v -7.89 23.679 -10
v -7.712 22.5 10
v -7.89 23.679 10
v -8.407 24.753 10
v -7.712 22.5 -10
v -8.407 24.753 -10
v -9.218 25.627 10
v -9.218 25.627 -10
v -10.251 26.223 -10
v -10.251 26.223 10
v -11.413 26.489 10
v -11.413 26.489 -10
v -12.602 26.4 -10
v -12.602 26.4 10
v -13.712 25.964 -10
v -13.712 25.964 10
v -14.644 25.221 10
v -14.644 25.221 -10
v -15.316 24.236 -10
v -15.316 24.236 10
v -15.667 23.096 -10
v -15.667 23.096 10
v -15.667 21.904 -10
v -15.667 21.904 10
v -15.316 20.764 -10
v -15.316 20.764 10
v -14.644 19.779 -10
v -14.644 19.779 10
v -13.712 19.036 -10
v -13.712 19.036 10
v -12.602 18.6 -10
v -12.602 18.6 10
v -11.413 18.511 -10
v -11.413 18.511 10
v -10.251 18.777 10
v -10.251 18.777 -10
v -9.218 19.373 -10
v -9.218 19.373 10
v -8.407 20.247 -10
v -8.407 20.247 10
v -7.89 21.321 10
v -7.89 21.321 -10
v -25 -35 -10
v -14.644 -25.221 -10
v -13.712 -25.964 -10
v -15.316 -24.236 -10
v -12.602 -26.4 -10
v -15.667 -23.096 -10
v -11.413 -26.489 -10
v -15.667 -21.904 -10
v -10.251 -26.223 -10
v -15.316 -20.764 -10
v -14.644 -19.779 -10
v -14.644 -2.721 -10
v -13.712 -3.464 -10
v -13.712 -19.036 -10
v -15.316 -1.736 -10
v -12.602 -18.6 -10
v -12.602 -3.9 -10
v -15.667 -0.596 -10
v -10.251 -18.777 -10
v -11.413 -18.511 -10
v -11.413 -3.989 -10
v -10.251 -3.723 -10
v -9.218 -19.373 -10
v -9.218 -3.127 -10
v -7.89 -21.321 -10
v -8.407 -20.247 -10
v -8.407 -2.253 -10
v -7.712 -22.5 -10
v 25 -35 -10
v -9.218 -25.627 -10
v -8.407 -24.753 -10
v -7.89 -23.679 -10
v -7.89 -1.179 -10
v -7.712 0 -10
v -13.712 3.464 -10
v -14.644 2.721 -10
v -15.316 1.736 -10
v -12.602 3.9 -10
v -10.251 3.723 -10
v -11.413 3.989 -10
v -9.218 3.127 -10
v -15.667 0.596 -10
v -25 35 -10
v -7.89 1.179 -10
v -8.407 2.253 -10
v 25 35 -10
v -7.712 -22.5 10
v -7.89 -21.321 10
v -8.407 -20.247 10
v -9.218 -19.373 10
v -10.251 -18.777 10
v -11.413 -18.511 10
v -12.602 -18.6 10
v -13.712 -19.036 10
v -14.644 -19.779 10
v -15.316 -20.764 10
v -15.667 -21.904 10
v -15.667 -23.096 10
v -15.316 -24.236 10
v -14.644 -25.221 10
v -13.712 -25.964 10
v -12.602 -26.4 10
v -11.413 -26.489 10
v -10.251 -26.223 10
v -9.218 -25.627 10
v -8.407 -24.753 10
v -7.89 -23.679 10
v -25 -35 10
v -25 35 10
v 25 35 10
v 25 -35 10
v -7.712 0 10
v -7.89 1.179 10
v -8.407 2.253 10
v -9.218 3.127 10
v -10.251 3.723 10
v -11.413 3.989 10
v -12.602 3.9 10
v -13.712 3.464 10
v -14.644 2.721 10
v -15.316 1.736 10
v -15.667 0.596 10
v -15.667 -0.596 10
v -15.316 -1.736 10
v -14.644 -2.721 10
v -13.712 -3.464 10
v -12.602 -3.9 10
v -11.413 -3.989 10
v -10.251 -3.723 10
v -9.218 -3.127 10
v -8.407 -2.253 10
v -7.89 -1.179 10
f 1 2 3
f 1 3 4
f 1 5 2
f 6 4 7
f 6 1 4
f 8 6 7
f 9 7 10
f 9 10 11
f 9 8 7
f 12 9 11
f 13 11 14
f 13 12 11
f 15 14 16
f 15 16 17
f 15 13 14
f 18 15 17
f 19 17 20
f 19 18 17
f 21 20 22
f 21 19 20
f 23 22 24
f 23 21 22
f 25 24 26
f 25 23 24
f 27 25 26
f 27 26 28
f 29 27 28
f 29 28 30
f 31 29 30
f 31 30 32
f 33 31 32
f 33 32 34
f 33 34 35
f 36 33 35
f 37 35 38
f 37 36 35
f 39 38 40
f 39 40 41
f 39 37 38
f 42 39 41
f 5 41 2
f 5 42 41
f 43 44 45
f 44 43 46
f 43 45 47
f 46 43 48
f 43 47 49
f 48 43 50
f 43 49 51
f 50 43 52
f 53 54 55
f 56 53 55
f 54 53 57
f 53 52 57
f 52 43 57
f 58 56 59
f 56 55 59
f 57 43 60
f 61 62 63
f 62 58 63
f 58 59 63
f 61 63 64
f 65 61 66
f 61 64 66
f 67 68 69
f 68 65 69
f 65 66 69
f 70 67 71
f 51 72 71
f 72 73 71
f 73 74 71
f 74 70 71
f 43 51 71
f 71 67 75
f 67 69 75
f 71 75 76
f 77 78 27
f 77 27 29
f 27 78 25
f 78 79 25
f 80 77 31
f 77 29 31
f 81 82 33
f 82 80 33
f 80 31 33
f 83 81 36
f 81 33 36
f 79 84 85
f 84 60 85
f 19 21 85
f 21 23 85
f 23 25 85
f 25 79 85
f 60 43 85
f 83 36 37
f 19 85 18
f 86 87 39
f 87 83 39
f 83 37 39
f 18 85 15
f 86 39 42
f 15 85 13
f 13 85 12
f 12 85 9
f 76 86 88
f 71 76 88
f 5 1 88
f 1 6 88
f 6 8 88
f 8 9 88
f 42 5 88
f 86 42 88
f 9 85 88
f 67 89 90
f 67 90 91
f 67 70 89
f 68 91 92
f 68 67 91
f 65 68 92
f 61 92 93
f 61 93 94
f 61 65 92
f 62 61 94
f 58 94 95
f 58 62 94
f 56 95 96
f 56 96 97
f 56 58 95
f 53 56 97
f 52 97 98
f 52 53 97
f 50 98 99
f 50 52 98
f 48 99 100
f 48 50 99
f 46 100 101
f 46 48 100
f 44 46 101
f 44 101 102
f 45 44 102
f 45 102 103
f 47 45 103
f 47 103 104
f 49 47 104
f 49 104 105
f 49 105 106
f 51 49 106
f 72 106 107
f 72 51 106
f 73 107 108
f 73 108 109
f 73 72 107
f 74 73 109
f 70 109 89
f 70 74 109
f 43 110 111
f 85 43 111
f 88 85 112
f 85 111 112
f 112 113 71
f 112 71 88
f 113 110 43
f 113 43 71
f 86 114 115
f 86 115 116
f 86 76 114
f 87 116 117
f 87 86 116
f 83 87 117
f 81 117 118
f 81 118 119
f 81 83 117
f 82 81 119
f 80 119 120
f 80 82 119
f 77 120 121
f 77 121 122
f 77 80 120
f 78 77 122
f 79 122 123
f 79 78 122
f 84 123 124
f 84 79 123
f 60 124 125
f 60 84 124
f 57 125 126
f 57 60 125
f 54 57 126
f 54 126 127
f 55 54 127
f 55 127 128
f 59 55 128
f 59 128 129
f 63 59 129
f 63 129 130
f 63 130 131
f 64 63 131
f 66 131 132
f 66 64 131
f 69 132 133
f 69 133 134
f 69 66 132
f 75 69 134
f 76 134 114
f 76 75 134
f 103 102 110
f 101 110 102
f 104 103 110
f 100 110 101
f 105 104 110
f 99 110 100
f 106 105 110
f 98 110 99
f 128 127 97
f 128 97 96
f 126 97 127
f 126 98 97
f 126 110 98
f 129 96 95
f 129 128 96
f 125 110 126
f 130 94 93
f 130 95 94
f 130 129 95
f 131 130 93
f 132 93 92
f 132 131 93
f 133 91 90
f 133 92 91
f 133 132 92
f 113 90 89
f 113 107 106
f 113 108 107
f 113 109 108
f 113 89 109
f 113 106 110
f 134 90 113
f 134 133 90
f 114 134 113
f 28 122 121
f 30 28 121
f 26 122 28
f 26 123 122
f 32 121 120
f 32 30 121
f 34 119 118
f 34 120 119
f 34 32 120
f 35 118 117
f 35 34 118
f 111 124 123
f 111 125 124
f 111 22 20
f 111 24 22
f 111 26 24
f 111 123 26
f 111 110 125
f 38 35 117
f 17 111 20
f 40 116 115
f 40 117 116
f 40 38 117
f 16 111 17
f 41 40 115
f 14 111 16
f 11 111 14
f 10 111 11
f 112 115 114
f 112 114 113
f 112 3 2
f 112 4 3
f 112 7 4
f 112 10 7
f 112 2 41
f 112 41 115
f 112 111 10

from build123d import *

# Parameters (mm, degrees)
SKETCH1_W           = 50
SKETCH1_H           = 70
SKETCH1_R           = 4
BOSS_EXTRUDE1_DEPTH = 10


with BuildPart() as part:
    # Sketch1 → Boss-Extrude1 (new body, symmetric)
    with BuildSketch(Plane.XY):
        Rectangle(SKETCH1_W, SKETCH1_H)
        with Locations((-11.712149785, 0)):
            Circle(SKETCH1_R, mode=Mode.SUBTRACT)
        with Locations((-11.712149785, 22.5)):
            Circle(SKETCH1_R, mode=Mode.SUBTRACT)
        with Locations((-11.712149785, -22.5)):
            Circle(SKETCH1_R, mode=Mode.SUBTRACT)
    extrude(amount=BOSS_EXTRUDE1_DEPTH, both=True)


solid = part.part
